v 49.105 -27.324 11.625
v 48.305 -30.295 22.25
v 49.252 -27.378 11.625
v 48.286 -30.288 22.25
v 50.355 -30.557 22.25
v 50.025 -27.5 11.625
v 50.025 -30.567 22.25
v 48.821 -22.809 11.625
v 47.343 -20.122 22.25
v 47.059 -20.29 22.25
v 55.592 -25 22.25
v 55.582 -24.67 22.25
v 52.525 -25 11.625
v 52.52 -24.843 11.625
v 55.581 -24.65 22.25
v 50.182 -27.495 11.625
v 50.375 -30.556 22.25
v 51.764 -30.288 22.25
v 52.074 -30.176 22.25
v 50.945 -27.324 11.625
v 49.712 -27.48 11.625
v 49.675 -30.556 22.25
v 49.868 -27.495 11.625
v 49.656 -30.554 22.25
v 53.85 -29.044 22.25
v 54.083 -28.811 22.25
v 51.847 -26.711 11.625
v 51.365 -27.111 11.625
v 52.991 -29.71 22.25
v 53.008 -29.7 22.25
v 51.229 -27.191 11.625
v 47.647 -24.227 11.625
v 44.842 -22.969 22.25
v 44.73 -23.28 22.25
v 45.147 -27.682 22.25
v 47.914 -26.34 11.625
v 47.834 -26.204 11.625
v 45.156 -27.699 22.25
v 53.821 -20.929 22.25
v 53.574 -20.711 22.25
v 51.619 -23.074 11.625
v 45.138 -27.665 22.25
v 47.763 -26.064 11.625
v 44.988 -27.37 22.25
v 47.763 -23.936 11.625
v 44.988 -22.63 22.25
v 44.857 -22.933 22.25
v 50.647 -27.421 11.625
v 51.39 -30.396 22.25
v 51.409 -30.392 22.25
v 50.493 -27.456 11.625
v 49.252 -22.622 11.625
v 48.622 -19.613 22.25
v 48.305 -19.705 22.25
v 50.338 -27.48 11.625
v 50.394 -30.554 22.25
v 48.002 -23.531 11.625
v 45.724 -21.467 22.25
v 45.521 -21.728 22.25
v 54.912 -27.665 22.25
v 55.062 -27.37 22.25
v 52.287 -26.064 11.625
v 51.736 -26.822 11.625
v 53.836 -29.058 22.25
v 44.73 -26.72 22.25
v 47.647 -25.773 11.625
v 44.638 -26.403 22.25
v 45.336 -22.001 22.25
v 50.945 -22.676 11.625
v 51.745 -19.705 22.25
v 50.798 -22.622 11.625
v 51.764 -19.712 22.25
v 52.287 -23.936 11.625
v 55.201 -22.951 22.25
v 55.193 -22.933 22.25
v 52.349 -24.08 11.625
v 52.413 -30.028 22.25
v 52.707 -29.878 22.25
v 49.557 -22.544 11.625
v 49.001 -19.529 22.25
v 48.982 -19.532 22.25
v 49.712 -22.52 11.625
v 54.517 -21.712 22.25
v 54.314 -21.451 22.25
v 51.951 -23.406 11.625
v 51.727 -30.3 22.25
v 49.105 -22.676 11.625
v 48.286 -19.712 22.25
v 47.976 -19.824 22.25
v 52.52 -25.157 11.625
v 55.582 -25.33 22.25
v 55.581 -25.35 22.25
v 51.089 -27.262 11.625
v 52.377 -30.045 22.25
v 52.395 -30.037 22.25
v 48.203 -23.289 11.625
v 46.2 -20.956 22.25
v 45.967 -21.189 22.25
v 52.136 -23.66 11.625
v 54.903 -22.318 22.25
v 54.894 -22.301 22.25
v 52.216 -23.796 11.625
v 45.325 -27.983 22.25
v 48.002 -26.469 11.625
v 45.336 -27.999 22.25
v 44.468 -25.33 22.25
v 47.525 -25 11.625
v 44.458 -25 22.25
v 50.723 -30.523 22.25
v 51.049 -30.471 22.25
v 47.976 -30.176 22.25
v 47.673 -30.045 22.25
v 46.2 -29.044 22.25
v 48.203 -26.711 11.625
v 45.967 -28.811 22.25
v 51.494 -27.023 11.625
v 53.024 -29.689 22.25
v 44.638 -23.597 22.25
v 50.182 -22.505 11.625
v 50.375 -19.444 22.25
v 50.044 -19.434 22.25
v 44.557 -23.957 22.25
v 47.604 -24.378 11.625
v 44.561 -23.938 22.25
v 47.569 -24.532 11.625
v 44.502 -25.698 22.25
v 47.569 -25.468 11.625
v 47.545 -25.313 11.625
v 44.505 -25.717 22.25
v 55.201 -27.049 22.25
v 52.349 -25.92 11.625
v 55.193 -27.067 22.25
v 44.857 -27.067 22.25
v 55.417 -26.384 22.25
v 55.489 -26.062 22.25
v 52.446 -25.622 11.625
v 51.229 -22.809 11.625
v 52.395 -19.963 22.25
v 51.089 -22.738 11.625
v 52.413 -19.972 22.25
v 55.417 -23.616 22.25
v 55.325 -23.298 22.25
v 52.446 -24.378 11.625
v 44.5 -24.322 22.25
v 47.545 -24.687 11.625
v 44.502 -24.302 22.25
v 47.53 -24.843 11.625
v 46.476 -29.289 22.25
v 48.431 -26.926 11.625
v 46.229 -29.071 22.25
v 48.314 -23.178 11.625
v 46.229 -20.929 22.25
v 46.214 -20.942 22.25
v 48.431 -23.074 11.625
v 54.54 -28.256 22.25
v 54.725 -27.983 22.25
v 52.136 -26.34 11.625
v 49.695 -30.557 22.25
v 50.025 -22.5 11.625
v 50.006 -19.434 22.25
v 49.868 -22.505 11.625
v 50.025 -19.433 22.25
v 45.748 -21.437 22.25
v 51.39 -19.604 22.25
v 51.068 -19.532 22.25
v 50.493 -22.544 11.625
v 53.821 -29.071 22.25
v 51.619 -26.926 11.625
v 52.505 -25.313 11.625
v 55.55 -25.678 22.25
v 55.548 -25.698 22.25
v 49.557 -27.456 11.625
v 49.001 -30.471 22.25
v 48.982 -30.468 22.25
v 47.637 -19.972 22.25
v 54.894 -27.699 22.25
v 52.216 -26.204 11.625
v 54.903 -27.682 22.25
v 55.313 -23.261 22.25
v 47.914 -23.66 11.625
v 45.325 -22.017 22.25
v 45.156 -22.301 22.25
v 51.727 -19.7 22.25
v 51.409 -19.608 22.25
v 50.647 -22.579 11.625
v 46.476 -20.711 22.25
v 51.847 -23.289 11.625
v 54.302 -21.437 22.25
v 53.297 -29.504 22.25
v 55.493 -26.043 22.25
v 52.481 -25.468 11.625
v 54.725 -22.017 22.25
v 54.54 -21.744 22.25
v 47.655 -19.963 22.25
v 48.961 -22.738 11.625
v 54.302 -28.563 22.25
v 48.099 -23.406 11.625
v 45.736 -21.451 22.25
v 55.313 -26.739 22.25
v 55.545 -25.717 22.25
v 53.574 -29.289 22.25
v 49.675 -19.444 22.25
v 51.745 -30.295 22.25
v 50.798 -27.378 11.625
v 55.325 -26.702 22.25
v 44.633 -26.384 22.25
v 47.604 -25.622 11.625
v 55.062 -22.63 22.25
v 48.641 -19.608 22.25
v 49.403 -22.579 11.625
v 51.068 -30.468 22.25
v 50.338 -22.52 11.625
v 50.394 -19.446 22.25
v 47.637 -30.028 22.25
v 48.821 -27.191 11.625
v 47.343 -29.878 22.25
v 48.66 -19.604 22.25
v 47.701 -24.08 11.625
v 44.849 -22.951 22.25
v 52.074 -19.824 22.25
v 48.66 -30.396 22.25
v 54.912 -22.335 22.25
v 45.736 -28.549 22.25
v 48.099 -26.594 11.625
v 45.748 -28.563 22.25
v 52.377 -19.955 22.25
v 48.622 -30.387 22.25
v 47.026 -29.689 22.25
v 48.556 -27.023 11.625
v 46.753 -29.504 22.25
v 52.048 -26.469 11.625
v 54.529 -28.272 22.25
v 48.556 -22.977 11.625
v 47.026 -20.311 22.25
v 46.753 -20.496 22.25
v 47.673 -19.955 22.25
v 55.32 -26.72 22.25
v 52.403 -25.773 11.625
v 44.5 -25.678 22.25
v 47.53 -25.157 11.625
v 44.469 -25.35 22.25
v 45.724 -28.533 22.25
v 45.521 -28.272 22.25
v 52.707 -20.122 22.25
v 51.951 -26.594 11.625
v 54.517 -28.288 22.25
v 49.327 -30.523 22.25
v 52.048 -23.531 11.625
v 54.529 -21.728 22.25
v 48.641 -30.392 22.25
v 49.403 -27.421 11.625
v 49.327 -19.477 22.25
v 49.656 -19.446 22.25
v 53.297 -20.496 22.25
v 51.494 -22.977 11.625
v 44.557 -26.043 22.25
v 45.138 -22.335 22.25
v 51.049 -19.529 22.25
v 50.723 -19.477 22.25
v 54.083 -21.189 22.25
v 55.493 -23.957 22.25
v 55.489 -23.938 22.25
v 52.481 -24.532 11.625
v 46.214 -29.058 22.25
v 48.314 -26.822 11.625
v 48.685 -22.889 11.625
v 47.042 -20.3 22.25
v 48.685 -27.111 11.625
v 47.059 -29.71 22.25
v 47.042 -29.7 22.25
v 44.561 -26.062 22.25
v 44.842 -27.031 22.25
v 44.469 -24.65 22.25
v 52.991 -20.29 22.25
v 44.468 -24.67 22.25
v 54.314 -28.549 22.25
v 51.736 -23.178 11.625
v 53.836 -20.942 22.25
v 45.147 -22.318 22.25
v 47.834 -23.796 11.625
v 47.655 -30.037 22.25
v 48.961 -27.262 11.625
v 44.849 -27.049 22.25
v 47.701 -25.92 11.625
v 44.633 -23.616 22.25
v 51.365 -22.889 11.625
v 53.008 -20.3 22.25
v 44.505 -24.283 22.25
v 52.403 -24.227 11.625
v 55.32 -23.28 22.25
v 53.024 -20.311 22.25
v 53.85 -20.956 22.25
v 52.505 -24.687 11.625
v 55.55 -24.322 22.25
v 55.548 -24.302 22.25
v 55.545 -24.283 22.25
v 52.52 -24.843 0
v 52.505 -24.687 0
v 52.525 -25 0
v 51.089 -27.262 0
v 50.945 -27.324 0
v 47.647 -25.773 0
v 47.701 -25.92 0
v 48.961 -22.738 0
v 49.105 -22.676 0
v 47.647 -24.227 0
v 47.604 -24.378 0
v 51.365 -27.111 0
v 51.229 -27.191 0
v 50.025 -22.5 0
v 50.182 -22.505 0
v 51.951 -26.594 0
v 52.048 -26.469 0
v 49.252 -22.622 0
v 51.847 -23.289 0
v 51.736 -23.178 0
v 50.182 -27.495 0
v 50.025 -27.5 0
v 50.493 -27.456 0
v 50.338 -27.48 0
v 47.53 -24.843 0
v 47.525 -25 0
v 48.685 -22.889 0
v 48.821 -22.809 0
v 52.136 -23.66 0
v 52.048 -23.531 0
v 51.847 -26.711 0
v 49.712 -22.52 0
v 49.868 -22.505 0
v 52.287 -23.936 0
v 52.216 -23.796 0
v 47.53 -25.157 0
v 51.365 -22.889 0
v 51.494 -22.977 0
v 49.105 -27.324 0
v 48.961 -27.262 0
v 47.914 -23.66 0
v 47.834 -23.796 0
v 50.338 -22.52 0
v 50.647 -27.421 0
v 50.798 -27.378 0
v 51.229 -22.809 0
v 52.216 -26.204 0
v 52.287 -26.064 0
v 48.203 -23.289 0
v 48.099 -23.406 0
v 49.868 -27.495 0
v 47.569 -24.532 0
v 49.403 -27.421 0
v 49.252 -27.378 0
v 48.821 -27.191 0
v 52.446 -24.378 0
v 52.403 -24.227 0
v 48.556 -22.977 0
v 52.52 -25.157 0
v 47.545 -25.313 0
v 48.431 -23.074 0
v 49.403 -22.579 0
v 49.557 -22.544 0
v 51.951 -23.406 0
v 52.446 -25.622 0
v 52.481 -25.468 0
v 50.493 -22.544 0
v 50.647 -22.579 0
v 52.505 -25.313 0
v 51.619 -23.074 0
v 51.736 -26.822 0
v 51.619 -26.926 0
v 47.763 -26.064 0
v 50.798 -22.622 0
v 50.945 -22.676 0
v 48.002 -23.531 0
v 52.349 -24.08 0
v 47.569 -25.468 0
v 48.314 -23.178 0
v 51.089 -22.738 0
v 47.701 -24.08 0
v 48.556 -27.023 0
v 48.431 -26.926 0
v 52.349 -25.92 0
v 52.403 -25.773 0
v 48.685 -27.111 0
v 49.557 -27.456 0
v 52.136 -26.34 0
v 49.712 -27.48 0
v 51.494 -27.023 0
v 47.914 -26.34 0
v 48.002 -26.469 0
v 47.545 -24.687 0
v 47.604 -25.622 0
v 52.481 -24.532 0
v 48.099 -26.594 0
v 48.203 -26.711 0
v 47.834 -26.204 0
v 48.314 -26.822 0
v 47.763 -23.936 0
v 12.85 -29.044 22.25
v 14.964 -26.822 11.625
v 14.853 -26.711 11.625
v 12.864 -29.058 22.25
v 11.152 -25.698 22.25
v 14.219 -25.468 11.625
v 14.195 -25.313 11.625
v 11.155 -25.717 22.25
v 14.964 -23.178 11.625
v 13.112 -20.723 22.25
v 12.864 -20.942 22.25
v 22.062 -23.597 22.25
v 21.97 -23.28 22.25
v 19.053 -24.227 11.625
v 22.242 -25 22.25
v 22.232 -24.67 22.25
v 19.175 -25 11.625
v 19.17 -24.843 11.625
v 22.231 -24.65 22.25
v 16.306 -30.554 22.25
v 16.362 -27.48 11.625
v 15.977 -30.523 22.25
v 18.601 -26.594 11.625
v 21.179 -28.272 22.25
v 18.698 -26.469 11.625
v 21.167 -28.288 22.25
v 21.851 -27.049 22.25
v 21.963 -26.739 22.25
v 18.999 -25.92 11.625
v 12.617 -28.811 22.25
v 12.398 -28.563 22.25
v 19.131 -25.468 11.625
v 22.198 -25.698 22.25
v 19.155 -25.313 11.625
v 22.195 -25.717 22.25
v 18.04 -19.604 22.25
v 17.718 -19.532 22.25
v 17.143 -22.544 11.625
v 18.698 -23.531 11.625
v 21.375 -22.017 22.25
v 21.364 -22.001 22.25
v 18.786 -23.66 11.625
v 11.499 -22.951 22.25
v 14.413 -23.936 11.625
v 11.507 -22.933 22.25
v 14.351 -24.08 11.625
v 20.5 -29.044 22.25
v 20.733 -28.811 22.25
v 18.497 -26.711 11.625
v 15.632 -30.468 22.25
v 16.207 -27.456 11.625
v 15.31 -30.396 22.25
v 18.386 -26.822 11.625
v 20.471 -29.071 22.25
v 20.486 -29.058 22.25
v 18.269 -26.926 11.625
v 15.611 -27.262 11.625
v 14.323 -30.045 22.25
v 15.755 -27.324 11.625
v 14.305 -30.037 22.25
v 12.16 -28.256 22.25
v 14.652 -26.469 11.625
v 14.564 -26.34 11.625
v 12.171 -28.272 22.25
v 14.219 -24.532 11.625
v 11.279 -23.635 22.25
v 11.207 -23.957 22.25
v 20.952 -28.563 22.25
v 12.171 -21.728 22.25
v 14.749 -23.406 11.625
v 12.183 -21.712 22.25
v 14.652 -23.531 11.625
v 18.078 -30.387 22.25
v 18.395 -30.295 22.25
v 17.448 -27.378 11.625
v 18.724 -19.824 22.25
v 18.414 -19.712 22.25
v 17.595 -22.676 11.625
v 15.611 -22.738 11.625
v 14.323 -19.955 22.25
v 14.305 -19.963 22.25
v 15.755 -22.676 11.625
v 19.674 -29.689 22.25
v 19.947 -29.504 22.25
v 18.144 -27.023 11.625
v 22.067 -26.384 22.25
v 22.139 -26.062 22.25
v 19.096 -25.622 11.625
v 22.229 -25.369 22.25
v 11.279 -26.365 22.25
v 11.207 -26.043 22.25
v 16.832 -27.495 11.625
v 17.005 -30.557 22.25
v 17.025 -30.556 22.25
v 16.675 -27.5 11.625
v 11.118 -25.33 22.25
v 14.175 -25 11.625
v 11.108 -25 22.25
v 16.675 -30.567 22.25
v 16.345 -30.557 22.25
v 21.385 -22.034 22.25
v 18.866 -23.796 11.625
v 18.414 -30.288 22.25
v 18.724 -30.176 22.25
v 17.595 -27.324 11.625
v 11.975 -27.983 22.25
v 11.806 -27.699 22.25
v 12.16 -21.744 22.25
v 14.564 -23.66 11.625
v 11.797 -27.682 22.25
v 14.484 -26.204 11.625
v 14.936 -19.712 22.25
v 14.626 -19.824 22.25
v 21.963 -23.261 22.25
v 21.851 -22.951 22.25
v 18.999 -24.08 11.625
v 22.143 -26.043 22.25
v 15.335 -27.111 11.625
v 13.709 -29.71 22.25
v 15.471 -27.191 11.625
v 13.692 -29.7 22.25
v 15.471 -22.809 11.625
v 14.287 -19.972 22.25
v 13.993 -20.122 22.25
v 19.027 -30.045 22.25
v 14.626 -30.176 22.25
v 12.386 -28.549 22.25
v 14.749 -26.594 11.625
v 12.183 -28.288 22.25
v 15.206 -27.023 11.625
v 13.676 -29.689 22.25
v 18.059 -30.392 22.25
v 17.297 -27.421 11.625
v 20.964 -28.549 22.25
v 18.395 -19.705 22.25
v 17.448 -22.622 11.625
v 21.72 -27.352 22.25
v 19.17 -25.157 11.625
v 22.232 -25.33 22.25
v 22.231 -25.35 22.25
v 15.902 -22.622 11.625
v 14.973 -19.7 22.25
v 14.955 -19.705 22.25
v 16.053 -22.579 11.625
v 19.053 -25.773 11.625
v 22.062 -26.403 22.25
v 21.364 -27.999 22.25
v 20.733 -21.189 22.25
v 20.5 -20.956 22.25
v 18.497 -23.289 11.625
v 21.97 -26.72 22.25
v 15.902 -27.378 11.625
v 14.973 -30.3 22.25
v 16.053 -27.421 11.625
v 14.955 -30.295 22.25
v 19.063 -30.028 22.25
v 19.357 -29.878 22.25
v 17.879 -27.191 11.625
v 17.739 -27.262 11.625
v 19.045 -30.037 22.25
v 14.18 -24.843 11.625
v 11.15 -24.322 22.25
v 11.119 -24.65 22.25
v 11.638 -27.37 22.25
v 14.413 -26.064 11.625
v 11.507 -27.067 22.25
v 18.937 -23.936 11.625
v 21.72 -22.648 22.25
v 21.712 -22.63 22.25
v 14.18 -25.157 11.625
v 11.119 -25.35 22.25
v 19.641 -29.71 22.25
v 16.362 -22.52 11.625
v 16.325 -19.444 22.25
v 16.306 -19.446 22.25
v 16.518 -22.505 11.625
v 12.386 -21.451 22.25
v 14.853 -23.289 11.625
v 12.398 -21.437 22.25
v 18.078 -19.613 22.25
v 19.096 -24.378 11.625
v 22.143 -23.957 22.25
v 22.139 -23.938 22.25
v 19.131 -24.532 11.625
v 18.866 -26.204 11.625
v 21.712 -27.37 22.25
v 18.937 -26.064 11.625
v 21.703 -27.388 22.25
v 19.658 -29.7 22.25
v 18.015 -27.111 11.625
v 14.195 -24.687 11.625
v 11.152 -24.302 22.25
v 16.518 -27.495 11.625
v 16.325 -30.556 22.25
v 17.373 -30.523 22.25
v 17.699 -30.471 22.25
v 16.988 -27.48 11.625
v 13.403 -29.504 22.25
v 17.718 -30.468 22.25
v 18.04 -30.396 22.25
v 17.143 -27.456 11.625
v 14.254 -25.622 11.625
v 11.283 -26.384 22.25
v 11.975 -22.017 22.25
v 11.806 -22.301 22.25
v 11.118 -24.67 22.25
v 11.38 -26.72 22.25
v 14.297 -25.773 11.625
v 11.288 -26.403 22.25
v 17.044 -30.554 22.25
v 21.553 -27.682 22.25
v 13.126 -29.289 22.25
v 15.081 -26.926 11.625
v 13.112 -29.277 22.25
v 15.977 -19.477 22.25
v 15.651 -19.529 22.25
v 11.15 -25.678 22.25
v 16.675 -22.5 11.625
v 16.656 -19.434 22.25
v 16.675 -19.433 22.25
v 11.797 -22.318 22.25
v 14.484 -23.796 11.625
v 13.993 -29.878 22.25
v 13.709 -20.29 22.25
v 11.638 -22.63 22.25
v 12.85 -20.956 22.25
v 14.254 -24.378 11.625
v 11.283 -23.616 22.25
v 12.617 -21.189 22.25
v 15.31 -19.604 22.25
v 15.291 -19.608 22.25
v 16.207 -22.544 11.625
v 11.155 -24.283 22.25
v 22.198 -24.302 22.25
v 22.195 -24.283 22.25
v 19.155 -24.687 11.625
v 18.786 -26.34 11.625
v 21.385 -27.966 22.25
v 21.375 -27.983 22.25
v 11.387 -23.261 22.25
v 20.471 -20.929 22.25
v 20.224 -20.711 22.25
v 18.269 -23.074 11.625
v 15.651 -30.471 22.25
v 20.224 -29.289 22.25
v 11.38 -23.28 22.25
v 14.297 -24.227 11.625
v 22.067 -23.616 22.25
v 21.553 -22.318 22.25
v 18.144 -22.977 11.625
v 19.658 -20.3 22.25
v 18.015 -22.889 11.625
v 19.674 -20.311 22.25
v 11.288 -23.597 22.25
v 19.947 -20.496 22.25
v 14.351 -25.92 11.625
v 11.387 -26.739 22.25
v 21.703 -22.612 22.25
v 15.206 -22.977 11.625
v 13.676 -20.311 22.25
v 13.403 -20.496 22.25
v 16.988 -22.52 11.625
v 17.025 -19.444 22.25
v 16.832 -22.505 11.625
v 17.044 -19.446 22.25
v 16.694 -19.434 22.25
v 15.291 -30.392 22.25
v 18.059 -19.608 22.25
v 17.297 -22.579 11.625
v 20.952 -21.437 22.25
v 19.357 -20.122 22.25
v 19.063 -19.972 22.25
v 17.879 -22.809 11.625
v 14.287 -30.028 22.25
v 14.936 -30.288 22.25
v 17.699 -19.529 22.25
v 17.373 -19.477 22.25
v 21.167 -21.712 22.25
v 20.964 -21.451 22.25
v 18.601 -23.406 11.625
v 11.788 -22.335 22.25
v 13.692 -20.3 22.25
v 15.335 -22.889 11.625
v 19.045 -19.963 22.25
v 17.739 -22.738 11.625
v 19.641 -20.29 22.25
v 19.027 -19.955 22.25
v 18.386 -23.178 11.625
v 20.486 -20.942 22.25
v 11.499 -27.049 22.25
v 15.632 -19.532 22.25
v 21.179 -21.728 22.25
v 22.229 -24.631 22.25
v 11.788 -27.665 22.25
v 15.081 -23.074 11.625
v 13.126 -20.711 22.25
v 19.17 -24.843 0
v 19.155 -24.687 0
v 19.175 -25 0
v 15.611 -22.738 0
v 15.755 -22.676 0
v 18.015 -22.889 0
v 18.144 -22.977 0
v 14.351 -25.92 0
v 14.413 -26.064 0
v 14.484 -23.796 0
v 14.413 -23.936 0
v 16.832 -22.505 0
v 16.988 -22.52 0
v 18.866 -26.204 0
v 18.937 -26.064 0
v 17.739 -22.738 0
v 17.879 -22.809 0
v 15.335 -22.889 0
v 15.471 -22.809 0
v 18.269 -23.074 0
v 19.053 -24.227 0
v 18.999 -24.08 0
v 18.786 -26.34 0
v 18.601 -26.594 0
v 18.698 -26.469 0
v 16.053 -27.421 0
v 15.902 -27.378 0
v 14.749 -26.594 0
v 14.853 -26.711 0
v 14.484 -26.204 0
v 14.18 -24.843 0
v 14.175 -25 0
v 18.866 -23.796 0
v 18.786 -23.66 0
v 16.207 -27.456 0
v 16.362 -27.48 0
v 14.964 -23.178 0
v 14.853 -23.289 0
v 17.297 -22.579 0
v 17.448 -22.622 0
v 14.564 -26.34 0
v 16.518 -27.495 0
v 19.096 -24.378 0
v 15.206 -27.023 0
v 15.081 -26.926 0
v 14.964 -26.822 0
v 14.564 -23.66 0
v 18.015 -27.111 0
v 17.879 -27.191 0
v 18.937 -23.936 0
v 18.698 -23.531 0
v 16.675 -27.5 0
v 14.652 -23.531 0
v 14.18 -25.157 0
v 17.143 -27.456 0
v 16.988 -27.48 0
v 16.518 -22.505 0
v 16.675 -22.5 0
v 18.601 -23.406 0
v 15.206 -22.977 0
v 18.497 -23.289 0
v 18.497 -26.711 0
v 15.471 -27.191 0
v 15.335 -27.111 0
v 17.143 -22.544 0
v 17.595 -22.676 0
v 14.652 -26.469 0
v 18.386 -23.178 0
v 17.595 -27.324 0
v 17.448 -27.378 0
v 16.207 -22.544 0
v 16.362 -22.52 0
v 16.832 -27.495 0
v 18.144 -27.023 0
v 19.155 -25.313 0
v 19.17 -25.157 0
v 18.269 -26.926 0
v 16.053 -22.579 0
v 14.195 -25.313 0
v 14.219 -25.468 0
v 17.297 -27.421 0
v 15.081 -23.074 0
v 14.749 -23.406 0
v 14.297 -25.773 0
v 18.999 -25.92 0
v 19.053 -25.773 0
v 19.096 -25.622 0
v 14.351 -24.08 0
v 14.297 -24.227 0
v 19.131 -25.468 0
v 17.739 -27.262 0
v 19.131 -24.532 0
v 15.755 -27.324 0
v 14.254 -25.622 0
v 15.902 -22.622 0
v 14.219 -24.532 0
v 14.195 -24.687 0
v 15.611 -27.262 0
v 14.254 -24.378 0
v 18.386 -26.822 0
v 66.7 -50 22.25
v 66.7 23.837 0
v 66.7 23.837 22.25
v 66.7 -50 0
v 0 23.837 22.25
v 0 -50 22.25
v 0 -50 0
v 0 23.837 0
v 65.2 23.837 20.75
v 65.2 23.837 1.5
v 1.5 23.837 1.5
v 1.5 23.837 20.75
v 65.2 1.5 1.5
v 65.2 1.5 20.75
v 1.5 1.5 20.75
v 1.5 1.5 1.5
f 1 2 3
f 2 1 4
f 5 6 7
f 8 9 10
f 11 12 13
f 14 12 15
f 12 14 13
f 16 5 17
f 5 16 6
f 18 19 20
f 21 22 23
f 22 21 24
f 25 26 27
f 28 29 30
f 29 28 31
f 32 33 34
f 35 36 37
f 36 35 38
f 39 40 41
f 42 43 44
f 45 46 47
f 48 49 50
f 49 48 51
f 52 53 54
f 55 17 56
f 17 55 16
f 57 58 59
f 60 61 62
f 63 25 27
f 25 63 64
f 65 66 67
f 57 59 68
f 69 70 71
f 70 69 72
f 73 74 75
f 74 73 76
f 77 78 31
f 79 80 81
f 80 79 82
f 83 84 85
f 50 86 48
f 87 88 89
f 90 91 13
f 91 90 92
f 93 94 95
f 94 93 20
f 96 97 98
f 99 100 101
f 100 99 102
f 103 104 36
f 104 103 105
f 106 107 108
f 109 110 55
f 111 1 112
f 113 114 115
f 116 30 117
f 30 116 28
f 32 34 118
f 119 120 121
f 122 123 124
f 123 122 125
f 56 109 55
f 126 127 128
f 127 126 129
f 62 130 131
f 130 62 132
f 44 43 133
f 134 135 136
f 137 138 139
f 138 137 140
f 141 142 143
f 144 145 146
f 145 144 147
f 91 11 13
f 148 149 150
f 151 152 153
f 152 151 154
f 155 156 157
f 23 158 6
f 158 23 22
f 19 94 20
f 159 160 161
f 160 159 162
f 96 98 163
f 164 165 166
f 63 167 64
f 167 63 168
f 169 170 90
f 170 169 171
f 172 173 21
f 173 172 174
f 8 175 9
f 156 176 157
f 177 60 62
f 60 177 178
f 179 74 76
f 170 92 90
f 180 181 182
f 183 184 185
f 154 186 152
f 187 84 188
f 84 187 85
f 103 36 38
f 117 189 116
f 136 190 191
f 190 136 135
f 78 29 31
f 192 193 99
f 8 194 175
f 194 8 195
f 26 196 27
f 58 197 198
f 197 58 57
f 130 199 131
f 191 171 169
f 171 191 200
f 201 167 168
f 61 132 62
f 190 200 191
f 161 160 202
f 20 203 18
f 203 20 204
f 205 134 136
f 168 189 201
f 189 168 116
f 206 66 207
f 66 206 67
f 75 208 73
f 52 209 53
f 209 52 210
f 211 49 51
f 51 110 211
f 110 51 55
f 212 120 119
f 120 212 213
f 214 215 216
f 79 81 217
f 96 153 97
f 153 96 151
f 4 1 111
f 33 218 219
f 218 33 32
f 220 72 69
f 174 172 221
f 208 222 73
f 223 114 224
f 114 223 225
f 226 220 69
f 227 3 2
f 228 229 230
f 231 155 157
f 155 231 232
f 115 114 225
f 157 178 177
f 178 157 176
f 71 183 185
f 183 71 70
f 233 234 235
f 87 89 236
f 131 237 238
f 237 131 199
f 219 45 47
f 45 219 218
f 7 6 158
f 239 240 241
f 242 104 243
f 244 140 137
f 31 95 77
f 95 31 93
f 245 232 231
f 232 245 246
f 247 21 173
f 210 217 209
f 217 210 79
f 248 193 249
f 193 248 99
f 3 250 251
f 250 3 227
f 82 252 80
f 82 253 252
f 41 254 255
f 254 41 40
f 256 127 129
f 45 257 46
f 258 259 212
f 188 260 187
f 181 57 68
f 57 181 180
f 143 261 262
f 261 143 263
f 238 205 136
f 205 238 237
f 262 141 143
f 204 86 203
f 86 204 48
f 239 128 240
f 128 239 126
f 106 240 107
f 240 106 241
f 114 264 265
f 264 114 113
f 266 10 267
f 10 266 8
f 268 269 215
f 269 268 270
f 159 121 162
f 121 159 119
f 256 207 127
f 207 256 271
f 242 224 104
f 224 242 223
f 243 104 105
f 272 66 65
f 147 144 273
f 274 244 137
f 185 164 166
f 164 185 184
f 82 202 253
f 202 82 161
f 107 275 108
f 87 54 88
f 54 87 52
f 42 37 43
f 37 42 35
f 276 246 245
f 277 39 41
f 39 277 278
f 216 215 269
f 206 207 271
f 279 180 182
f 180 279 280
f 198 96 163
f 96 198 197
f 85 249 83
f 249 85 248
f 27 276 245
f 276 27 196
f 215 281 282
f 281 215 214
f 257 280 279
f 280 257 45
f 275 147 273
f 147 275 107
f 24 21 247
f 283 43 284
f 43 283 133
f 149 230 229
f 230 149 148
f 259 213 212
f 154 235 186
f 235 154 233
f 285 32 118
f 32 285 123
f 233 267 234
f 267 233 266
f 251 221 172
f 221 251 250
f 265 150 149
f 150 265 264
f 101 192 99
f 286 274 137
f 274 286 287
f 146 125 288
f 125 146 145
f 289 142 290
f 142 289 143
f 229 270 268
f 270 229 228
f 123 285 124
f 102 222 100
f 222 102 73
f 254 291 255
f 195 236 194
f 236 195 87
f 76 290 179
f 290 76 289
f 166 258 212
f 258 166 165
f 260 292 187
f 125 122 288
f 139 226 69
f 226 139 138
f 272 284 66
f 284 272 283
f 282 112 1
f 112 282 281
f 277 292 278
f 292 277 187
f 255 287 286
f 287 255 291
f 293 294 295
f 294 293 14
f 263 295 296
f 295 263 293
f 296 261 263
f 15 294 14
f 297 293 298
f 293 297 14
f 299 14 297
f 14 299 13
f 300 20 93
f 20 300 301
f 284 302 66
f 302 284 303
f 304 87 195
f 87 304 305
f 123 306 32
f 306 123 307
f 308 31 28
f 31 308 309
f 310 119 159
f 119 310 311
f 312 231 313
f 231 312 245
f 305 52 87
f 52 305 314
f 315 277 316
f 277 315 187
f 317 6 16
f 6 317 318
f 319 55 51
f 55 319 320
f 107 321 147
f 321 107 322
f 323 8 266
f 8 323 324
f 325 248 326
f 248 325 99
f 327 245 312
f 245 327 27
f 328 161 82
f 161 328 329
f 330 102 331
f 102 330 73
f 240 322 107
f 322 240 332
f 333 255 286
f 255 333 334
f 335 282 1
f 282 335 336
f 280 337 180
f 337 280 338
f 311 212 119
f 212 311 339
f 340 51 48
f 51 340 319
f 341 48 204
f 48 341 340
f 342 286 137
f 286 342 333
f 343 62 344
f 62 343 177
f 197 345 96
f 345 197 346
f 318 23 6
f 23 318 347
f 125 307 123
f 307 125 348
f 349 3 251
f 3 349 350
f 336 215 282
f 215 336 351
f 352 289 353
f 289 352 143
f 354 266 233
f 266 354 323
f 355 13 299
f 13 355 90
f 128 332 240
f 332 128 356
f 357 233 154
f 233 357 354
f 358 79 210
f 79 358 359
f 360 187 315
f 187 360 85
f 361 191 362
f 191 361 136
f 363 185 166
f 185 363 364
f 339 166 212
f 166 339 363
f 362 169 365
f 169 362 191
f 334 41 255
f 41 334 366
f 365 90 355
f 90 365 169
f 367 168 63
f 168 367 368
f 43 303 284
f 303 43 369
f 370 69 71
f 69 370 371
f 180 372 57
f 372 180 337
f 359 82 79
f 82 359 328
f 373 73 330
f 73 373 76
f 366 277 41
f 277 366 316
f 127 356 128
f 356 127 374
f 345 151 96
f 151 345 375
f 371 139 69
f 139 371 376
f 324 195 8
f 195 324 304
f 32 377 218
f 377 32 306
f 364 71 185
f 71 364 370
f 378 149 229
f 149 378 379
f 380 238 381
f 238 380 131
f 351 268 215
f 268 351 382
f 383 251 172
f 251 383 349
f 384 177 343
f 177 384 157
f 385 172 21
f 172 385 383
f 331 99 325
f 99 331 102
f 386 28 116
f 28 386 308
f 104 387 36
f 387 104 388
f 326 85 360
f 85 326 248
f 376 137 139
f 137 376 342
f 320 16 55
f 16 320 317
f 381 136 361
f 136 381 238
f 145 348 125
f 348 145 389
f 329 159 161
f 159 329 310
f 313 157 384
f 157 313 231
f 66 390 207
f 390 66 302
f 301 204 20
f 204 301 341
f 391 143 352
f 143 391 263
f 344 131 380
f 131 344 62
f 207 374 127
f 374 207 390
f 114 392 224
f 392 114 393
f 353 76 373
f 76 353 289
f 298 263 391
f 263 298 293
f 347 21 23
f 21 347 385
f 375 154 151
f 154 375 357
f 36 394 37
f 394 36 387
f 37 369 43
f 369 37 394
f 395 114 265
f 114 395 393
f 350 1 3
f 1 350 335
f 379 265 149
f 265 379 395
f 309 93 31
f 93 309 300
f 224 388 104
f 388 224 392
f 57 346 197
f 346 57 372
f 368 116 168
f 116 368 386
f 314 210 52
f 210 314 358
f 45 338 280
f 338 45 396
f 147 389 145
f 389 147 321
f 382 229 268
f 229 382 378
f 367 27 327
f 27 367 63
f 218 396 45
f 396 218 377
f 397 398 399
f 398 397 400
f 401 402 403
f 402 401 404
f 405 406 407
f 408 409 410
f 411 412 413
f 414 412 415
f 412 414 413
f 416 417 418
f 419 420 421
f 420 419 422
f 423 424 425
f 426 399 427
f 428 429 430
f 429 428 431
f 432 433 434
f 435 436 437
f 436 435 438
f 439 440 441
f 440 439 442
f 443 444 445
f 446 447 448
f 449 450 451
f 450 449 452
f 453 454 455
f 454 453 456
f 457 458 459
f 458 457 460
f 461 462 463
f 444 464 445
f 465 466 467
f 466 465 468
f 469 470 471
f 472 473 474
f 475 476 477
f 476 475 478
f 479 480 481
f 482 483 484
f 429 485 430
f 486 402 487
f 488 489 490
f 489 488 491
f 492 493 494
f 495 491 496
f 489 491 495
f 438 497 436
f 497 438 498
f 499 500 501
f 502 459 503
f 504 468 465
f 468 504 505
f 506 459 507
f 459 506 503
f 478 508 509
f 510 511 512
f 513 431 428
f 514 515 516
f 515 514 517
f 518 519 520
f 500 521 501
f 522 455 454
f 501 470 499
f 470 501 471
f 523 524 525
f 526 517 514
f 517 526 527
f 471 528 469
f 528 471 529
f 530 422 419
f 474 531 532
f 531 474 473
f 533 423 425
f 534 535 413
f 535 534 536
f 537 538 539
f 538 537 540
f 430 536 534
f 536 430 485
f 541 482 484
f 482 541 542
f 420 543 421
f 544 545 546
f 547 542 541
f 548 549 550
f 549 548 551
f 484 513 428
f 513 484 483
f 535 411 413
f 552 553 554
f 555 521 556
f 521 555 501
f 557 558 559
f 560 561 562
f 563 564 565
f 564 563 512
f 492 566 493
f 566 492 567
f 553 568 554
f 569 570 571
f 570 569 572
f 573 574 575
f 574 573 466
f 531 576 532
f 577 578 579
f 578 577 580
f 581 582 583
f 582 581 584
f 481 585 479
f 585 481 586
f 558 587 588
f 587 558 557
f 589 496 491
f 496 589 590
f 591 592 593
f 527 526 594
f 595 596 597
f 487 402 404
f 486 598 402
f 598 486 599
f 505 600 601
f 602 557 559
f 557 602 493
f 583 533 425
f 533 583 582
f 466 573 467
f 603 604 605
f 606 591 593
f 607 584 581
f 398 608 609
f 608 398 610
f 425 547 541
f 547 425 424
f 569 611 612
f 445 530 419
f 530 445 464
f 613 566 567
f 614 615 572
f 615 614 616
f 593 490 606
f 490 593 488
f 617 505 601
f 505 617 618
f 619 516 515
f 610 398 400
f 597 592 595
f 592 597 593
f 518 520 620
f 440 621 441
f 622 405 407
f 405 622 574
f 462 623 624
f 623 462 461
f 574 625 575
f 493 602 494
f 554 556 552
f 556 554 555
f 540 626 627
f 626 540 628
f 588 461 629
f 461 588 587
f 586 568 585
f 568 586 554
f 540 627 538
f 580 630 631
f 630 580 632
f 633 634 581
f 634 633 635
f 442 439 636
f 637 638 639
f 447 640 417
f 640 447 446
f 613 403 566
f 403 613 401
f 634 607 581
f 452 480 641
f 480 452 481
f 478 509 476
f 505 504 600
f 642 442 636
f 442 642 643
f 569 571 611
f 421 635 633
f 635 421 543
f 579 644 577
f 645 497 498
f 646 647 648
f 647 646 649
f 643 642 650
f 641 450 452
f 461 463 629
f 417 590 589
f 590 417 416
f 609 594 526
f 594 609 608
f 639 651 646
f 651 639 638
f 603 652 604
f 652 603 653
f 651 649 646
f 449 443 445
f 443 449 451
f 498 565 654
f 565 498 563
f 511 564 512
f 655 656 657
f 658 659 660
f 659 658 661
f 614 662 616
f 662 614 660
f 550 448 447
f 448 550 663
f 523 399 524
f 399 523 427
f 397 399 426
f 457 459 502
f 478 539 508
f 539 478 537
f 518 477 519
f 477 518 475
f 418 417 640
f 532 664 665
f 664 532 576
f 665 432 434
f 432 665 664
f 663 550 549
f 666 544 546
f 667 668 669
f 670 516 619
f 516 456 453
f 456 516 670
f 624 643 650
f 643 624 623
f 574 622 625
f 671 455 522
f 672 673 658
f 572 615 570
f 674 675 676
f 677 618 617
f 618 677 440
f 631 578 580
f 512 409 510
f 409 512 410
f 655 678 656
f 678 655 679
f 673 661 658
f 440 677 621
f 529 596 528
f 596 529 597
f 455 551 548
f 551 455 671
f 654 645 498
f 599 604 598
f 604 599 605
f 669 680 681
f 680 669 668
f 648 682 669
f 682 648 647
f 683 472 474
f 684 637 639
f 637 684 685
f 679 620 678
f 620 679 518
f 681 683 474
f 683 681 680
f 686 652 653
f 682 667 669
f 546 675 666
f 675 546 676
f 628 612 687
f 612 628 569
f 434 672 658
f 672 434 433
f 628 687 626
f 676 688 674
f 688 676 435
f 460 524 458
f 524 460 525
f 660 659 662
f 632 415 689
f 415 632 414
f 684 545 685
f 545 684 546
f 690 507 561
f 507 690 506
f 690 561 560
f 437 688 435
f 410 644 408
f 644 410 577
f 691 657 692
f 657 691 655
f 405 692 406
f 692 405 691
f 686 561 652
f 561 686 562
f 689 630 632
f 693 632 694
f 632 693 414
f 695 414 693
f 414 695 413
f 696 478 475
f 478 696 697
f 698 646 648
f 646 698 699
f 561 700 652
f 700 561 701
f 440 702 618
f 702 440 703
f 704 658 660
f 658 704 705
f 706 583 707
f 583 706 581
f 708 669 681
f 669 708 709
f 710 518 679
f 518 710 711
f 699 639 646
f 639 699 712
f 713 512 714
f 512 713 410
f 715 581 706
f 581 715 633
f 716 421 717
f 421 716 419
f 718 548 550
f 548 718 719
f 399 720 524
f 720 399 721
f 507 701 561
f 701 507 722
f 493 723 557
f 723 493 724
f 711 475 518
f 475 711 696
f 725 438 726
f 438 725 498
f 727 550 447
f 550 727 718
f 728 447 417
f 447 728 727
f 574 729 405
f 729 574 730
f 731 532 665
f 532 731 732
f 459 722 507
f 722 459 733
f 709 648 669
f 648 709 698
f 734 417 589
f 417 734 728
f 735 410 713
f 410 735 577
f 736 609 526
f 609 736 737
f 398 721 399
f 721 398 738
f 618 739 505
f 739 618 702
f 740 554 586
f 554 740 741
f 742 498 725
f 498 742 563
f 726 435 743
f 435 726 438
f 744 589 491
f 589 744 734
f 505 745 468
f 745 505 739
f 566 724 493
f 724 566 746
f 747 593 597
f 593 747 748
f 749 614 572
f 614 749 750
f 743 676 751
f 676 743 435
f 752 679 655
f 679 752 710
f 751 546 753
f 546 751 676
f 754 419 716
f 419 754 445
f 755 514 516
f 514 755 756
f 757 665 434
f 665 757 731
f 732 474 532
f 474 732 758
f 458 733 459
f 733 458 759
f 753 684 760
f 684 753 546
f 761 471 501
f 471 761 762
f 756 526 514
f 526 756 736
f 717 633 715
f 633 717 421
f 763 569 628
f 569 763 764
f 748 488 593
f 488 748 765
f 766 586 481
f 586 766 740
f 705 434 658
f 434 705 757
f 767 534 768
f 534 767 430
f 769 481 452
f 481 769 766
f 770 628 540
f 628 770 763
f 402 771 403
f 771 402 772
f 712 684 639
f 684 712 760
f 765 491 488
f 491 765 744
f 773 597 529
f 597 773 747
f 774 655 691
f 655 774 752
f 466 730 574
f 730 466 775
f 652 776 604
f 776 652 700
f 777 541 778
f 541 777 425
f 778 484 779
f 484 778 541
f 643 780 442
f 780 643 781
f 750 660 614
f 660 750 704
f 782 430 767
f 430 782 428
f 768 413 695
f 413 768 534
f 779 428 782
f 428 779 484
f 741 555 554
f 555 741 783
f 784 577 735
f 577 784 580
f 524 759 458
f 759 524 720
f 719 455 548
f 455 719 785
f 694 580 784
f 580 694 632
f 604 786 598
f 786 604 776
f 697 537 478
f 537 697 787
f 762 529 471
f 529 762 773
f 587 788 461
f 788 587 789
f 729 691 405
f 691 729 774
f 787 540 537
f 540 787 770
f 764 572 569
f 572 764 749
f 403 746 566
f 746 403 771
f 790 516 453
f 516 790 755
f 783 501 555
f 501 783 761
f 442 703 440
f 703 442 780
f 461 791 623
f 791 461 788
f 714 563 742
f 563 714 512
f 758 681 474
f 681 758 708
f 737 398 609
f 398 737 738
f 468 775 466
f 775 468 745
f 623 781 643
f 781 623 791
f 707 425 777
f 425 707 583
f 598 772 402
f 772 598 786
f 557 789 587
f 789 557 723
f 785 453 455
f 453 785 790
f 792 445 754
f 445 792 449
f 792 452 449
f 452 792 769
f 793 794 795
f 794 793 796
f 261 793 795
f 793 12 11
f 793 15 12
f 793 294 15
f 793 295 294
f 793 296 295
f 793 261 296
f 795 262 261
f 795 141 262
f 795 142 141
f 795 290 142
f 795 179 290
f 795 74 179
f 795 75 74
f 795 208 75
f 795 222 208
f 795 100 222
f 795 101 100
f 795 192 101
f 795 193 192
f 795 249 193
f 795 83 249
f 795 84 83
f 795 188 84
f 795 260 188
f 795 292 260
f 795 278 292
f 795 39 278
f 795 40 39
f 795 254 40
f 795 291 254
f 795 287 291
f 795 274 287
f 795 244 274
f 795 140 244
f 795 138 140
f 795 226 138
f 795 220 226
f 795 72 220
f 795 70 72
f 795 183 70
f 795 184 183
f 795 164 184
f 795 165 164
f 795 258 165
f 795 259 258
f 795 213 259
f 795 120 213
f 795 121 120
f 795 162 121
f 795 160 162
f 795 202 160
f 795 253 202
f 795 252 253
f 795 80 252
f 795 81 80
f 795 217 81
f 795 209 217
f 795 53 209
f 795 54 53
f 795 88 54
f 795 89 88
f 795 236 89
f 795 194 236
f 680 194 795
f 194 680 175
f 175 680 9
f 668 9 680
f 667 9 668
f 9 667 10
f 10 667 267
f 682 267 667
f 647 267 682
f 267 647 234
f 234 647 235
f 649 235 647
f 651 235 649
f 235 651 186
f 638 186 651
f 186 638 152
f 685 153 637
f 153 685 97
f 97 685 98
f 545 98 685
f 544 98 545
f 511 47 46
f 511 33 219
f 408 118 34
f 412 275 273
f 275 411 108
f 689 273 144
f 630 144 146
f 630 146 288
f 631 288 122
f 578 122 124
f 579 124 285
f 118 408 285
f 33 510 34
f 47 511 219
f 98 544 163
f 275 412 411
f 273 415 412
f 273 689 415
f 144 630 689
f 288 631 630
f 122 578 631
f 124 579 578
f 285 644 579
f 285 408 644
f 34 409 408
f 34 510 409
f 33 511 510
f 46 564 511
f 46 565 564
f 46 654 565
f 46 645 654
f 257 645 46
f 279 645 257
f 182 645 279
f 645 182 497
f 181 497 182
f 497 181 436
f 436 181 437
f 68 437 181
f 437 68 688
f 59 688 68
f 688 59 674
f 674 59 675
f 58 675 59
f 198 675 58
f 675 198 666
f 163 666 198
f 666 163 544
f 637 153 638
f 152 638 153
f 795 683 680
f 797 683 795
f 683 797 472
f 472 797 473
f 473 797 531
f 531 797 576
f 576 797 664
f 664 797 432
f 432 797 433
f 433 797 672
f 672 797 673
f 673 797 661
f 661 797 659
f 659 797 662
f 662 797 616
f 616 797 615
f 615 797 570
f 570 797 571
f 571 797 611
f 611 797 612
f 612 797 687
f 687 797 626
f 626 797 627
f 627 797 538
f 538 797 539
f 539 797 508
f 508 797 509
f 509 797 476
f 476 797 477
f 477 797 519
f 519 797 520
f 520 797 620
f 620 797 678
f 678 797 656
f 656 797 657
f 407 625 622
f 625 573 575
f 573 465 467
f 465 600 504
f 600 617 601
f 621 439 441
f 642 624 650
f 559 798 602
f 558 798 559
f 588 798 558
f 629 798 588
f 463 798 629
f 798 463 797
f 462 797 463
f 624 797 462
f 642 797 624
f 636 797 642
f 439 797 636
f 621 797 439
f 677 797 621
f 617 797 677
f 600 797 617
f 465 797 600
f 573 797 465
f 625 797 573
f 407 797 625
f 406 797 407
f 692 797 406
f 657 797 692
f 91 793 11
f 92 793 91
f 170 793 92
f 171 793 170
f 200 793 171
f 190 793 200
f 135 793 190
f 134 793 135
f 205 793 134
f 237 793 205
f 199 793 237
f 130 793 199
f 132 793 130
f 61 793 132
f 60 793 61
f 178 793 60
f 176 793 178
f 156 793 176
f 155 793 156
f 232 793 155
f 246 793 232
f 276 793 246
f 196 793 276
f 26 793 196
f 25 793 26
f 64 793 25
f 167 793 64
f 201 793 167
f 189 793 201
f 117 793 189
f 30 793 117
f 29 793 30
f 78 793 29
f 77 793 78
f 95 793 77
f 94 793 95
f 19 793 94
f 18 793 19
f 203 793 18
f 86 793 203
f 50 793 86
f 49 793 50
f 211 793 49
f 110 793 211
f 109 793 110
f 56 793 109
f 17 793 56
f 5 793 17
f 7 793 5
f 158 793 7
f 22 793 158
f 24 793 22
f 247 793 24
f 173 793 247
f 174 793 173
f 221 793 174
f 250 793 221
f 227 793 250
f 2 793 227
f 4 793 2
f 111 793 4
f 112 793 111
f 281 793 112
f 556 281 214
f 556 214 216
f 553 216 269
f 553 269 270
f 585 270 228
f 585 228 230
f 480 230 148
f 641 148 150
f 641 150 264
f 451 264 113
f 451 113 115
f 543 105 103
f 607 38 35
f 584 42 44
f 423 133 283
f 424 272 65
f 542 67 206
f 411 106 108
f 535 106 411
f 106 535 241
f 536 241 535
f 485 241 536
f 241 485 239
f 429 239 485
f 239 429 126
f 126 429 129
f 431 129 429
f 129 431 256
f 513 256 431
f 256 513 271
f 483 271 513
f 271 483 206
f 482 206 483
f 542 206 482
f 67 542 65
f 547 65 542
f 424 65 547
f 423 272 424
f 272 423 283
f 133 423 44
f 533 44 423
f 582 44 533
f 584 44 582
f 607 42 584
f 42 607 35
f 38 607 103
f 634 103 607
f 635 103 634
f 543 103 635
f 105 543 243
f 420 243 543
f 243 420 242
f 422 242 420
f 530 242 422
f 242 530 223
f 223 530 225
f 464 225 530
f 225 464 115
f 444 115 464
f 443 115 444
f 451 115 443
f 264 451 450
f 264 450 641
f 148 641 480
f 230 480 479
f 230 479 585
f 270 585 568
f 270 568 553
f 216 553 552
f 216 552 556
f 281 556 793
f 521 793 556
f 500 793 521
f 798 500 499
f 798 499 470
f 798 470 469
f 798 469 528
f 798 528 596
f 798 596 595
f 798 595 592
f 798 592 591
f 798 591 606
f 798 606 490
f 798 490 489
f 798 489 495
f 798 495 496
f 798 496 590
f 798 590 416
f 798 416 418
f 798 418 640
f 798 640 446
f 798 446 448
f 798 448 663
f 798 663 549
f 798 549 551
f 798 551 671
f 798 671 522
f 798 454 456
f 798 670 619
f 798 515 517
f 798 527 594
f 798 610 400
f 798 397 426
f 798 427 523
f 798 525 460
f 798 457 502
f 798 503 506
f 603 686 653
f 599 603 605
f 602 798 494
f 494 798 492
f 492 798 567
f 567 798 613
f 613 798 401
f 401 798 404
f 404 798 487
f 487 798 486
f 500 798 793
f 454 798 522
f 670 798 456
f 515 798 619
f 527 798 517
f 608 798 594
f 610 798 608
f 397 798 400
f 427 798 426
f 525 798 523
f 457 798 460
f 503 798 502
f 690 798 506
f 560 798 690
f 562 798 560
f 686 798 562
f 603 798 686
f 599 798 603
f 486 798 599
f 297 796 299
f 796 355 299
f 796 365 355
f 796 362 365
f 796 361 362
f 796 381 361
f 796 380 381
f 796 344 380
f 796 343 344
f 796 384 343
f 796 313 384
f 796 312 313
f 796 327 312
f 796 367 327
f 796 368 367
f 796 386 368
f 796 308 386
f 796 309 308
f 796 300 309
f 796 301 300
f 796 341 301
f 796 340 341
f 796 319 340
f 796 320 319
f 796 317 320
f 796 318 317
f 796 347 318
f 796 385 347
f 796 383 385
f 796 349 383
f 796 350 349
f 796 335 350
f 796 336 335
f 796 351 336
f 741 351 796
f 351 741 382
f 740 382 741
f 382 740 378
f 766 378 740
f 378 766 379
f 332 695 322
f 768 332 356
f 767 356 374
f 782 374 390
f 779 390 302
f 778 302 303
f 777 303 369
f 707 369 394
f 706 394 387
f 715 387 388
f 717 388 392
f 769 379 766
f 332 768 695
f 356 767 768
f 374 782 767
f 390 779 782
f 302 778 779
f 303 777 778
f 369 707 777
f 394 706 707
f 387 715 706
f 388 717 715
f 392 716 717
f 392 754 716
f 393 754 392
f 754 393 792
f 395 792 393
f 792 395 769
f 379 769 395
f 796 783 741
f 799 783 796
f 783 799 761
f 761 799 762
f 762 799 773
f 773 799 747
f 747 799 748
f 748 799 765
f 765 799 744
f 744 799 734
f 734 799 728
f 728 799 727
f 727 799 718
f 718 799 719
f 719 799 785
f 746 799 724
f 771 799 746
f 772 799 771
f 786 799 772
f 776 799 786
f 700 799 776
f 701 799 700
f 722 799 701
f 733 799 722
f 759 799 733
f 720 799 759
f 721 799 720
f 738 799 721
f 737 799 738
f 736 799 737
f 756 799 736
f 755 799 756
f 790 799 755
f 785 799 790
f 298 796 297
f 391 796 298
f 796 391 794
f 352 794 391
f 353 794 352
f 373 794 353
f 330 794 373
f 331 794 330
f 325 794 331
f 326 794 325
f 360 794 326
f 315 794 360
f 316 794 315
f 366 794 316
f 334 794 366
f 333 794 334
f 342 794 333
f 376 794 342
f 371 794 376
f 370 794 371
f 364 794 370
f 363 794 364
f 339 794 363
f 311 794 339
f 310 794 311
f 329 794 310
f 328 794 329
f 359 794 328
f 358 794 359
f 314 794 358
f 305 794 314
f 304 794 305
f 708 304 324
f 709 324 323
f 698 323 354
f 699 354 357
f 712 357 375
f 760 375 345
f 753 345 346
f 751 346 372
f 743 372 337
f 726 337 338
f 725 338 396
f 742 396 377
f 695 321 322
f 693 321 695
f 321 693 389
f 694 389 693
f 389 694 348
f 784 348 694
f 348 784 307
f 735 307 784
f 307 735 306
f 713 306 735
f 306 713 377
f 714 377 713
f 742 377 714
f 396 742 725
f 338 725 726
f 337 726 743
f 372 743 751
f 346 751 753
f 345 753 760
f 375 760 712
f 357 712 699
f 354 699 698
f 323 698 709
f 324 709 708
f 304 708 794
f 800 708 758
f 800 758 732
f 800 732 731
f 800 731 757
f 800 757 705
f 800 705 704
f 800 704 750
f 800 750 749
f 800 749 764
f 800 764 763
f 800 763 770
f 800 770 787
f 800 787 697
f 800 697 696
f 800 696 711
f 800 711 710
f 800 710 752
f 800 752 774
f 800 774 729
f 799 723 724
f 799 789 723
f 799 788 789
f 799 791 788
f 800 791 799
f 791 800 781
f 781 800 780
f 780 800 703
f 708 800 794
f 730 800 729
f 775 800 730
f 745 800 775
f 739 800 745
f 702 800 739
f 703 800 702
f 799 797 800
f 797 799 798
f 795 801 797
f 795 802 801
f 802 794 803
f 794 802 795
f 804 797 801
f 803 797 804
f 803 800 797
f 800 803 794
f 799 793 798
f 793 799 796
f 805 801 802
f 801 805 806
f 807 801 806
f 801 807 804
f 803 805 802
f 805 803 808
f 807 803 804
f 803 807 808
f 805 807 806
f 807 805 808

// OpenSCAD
// file: defines.scad
// External measurements from the magnetic knife holder (in inches)

LENGTH_INCHES  = 13 + 3/4;
HEIGHT_INCHES  = 2 + 1/2;
DEPTH_INCHES   = 3/4;
SPACING_INCHES = 13/16;

INCHES_TO_MM = 25.4 / 1; // mm per inch

// Below here is in mm
// Interface to the Block

LENGTH  = LENGTH_INCHES * INCHES_TO_MM;
HEIGHT  = HEIGHT_INCHES * INCHES_TO_MM;
DEPTH   = DEPTH_INCHES * INCHES_TO_MM;
SPACING = SPACING_INCHES * INCHES_TO_MM;

MOUNT_LENGTH = SPACING;

PAD_H = 0.2; // What to pad HEIGHT by
PAD_L = 0.2; // What to pad LENGTH by
PAD_D = 0.2; // What to pad DEPTH by

WALL = 1.5; // Wall thickness

// Custom section
// Screw mount bits

CUSTOM = 50; 
HOLE =  5; // Diameter of the screw holes
HEAD = 12; // Diameter of the screw holes head (for chamfer0
// main file
include <defines.scad>

module screw_hole(x, y, z, d1, d2, depth, wall=1) {
    // Cone
    translate([x, y, (depth/2)+(wall/2)]) {
        cylinder(d1=d1, d2=d2, h=(depth/2)+wall, $fn=100);
    }

    // Hole
    translate([x, y, -wall]) {
        cylinder(d=d1, h=(depth/2)+2*wall, $fn=100);
    }
}

module one_hole2(height, length, depth, wall, extension, hole, head) {
    h = height + (2*wall);
    l = length + (2*wall);
    d = depth  + (2*wall);

    difference() {
        translate([0, -extension, 0]) {
            cube([h, l+extension, d]);
        }

        translate([wall, wall, wall]) {
            cube([height, 2*length, depth]);
        }

        screw_hole(0.75*h, -extension/2, d, hole, head, depth=d);
        screw_hole(0.25*h, -extension/2, d, hole, head, depth=d);
    }
}

one_hole2(
    HEIGHT+PAD_H, 
    MOUNT_LENGTH+PAD_L, 
    DEPTH+PAD_D, 
    WALL,
    CUSTOM,
    HOLE,
    HEAD
);
